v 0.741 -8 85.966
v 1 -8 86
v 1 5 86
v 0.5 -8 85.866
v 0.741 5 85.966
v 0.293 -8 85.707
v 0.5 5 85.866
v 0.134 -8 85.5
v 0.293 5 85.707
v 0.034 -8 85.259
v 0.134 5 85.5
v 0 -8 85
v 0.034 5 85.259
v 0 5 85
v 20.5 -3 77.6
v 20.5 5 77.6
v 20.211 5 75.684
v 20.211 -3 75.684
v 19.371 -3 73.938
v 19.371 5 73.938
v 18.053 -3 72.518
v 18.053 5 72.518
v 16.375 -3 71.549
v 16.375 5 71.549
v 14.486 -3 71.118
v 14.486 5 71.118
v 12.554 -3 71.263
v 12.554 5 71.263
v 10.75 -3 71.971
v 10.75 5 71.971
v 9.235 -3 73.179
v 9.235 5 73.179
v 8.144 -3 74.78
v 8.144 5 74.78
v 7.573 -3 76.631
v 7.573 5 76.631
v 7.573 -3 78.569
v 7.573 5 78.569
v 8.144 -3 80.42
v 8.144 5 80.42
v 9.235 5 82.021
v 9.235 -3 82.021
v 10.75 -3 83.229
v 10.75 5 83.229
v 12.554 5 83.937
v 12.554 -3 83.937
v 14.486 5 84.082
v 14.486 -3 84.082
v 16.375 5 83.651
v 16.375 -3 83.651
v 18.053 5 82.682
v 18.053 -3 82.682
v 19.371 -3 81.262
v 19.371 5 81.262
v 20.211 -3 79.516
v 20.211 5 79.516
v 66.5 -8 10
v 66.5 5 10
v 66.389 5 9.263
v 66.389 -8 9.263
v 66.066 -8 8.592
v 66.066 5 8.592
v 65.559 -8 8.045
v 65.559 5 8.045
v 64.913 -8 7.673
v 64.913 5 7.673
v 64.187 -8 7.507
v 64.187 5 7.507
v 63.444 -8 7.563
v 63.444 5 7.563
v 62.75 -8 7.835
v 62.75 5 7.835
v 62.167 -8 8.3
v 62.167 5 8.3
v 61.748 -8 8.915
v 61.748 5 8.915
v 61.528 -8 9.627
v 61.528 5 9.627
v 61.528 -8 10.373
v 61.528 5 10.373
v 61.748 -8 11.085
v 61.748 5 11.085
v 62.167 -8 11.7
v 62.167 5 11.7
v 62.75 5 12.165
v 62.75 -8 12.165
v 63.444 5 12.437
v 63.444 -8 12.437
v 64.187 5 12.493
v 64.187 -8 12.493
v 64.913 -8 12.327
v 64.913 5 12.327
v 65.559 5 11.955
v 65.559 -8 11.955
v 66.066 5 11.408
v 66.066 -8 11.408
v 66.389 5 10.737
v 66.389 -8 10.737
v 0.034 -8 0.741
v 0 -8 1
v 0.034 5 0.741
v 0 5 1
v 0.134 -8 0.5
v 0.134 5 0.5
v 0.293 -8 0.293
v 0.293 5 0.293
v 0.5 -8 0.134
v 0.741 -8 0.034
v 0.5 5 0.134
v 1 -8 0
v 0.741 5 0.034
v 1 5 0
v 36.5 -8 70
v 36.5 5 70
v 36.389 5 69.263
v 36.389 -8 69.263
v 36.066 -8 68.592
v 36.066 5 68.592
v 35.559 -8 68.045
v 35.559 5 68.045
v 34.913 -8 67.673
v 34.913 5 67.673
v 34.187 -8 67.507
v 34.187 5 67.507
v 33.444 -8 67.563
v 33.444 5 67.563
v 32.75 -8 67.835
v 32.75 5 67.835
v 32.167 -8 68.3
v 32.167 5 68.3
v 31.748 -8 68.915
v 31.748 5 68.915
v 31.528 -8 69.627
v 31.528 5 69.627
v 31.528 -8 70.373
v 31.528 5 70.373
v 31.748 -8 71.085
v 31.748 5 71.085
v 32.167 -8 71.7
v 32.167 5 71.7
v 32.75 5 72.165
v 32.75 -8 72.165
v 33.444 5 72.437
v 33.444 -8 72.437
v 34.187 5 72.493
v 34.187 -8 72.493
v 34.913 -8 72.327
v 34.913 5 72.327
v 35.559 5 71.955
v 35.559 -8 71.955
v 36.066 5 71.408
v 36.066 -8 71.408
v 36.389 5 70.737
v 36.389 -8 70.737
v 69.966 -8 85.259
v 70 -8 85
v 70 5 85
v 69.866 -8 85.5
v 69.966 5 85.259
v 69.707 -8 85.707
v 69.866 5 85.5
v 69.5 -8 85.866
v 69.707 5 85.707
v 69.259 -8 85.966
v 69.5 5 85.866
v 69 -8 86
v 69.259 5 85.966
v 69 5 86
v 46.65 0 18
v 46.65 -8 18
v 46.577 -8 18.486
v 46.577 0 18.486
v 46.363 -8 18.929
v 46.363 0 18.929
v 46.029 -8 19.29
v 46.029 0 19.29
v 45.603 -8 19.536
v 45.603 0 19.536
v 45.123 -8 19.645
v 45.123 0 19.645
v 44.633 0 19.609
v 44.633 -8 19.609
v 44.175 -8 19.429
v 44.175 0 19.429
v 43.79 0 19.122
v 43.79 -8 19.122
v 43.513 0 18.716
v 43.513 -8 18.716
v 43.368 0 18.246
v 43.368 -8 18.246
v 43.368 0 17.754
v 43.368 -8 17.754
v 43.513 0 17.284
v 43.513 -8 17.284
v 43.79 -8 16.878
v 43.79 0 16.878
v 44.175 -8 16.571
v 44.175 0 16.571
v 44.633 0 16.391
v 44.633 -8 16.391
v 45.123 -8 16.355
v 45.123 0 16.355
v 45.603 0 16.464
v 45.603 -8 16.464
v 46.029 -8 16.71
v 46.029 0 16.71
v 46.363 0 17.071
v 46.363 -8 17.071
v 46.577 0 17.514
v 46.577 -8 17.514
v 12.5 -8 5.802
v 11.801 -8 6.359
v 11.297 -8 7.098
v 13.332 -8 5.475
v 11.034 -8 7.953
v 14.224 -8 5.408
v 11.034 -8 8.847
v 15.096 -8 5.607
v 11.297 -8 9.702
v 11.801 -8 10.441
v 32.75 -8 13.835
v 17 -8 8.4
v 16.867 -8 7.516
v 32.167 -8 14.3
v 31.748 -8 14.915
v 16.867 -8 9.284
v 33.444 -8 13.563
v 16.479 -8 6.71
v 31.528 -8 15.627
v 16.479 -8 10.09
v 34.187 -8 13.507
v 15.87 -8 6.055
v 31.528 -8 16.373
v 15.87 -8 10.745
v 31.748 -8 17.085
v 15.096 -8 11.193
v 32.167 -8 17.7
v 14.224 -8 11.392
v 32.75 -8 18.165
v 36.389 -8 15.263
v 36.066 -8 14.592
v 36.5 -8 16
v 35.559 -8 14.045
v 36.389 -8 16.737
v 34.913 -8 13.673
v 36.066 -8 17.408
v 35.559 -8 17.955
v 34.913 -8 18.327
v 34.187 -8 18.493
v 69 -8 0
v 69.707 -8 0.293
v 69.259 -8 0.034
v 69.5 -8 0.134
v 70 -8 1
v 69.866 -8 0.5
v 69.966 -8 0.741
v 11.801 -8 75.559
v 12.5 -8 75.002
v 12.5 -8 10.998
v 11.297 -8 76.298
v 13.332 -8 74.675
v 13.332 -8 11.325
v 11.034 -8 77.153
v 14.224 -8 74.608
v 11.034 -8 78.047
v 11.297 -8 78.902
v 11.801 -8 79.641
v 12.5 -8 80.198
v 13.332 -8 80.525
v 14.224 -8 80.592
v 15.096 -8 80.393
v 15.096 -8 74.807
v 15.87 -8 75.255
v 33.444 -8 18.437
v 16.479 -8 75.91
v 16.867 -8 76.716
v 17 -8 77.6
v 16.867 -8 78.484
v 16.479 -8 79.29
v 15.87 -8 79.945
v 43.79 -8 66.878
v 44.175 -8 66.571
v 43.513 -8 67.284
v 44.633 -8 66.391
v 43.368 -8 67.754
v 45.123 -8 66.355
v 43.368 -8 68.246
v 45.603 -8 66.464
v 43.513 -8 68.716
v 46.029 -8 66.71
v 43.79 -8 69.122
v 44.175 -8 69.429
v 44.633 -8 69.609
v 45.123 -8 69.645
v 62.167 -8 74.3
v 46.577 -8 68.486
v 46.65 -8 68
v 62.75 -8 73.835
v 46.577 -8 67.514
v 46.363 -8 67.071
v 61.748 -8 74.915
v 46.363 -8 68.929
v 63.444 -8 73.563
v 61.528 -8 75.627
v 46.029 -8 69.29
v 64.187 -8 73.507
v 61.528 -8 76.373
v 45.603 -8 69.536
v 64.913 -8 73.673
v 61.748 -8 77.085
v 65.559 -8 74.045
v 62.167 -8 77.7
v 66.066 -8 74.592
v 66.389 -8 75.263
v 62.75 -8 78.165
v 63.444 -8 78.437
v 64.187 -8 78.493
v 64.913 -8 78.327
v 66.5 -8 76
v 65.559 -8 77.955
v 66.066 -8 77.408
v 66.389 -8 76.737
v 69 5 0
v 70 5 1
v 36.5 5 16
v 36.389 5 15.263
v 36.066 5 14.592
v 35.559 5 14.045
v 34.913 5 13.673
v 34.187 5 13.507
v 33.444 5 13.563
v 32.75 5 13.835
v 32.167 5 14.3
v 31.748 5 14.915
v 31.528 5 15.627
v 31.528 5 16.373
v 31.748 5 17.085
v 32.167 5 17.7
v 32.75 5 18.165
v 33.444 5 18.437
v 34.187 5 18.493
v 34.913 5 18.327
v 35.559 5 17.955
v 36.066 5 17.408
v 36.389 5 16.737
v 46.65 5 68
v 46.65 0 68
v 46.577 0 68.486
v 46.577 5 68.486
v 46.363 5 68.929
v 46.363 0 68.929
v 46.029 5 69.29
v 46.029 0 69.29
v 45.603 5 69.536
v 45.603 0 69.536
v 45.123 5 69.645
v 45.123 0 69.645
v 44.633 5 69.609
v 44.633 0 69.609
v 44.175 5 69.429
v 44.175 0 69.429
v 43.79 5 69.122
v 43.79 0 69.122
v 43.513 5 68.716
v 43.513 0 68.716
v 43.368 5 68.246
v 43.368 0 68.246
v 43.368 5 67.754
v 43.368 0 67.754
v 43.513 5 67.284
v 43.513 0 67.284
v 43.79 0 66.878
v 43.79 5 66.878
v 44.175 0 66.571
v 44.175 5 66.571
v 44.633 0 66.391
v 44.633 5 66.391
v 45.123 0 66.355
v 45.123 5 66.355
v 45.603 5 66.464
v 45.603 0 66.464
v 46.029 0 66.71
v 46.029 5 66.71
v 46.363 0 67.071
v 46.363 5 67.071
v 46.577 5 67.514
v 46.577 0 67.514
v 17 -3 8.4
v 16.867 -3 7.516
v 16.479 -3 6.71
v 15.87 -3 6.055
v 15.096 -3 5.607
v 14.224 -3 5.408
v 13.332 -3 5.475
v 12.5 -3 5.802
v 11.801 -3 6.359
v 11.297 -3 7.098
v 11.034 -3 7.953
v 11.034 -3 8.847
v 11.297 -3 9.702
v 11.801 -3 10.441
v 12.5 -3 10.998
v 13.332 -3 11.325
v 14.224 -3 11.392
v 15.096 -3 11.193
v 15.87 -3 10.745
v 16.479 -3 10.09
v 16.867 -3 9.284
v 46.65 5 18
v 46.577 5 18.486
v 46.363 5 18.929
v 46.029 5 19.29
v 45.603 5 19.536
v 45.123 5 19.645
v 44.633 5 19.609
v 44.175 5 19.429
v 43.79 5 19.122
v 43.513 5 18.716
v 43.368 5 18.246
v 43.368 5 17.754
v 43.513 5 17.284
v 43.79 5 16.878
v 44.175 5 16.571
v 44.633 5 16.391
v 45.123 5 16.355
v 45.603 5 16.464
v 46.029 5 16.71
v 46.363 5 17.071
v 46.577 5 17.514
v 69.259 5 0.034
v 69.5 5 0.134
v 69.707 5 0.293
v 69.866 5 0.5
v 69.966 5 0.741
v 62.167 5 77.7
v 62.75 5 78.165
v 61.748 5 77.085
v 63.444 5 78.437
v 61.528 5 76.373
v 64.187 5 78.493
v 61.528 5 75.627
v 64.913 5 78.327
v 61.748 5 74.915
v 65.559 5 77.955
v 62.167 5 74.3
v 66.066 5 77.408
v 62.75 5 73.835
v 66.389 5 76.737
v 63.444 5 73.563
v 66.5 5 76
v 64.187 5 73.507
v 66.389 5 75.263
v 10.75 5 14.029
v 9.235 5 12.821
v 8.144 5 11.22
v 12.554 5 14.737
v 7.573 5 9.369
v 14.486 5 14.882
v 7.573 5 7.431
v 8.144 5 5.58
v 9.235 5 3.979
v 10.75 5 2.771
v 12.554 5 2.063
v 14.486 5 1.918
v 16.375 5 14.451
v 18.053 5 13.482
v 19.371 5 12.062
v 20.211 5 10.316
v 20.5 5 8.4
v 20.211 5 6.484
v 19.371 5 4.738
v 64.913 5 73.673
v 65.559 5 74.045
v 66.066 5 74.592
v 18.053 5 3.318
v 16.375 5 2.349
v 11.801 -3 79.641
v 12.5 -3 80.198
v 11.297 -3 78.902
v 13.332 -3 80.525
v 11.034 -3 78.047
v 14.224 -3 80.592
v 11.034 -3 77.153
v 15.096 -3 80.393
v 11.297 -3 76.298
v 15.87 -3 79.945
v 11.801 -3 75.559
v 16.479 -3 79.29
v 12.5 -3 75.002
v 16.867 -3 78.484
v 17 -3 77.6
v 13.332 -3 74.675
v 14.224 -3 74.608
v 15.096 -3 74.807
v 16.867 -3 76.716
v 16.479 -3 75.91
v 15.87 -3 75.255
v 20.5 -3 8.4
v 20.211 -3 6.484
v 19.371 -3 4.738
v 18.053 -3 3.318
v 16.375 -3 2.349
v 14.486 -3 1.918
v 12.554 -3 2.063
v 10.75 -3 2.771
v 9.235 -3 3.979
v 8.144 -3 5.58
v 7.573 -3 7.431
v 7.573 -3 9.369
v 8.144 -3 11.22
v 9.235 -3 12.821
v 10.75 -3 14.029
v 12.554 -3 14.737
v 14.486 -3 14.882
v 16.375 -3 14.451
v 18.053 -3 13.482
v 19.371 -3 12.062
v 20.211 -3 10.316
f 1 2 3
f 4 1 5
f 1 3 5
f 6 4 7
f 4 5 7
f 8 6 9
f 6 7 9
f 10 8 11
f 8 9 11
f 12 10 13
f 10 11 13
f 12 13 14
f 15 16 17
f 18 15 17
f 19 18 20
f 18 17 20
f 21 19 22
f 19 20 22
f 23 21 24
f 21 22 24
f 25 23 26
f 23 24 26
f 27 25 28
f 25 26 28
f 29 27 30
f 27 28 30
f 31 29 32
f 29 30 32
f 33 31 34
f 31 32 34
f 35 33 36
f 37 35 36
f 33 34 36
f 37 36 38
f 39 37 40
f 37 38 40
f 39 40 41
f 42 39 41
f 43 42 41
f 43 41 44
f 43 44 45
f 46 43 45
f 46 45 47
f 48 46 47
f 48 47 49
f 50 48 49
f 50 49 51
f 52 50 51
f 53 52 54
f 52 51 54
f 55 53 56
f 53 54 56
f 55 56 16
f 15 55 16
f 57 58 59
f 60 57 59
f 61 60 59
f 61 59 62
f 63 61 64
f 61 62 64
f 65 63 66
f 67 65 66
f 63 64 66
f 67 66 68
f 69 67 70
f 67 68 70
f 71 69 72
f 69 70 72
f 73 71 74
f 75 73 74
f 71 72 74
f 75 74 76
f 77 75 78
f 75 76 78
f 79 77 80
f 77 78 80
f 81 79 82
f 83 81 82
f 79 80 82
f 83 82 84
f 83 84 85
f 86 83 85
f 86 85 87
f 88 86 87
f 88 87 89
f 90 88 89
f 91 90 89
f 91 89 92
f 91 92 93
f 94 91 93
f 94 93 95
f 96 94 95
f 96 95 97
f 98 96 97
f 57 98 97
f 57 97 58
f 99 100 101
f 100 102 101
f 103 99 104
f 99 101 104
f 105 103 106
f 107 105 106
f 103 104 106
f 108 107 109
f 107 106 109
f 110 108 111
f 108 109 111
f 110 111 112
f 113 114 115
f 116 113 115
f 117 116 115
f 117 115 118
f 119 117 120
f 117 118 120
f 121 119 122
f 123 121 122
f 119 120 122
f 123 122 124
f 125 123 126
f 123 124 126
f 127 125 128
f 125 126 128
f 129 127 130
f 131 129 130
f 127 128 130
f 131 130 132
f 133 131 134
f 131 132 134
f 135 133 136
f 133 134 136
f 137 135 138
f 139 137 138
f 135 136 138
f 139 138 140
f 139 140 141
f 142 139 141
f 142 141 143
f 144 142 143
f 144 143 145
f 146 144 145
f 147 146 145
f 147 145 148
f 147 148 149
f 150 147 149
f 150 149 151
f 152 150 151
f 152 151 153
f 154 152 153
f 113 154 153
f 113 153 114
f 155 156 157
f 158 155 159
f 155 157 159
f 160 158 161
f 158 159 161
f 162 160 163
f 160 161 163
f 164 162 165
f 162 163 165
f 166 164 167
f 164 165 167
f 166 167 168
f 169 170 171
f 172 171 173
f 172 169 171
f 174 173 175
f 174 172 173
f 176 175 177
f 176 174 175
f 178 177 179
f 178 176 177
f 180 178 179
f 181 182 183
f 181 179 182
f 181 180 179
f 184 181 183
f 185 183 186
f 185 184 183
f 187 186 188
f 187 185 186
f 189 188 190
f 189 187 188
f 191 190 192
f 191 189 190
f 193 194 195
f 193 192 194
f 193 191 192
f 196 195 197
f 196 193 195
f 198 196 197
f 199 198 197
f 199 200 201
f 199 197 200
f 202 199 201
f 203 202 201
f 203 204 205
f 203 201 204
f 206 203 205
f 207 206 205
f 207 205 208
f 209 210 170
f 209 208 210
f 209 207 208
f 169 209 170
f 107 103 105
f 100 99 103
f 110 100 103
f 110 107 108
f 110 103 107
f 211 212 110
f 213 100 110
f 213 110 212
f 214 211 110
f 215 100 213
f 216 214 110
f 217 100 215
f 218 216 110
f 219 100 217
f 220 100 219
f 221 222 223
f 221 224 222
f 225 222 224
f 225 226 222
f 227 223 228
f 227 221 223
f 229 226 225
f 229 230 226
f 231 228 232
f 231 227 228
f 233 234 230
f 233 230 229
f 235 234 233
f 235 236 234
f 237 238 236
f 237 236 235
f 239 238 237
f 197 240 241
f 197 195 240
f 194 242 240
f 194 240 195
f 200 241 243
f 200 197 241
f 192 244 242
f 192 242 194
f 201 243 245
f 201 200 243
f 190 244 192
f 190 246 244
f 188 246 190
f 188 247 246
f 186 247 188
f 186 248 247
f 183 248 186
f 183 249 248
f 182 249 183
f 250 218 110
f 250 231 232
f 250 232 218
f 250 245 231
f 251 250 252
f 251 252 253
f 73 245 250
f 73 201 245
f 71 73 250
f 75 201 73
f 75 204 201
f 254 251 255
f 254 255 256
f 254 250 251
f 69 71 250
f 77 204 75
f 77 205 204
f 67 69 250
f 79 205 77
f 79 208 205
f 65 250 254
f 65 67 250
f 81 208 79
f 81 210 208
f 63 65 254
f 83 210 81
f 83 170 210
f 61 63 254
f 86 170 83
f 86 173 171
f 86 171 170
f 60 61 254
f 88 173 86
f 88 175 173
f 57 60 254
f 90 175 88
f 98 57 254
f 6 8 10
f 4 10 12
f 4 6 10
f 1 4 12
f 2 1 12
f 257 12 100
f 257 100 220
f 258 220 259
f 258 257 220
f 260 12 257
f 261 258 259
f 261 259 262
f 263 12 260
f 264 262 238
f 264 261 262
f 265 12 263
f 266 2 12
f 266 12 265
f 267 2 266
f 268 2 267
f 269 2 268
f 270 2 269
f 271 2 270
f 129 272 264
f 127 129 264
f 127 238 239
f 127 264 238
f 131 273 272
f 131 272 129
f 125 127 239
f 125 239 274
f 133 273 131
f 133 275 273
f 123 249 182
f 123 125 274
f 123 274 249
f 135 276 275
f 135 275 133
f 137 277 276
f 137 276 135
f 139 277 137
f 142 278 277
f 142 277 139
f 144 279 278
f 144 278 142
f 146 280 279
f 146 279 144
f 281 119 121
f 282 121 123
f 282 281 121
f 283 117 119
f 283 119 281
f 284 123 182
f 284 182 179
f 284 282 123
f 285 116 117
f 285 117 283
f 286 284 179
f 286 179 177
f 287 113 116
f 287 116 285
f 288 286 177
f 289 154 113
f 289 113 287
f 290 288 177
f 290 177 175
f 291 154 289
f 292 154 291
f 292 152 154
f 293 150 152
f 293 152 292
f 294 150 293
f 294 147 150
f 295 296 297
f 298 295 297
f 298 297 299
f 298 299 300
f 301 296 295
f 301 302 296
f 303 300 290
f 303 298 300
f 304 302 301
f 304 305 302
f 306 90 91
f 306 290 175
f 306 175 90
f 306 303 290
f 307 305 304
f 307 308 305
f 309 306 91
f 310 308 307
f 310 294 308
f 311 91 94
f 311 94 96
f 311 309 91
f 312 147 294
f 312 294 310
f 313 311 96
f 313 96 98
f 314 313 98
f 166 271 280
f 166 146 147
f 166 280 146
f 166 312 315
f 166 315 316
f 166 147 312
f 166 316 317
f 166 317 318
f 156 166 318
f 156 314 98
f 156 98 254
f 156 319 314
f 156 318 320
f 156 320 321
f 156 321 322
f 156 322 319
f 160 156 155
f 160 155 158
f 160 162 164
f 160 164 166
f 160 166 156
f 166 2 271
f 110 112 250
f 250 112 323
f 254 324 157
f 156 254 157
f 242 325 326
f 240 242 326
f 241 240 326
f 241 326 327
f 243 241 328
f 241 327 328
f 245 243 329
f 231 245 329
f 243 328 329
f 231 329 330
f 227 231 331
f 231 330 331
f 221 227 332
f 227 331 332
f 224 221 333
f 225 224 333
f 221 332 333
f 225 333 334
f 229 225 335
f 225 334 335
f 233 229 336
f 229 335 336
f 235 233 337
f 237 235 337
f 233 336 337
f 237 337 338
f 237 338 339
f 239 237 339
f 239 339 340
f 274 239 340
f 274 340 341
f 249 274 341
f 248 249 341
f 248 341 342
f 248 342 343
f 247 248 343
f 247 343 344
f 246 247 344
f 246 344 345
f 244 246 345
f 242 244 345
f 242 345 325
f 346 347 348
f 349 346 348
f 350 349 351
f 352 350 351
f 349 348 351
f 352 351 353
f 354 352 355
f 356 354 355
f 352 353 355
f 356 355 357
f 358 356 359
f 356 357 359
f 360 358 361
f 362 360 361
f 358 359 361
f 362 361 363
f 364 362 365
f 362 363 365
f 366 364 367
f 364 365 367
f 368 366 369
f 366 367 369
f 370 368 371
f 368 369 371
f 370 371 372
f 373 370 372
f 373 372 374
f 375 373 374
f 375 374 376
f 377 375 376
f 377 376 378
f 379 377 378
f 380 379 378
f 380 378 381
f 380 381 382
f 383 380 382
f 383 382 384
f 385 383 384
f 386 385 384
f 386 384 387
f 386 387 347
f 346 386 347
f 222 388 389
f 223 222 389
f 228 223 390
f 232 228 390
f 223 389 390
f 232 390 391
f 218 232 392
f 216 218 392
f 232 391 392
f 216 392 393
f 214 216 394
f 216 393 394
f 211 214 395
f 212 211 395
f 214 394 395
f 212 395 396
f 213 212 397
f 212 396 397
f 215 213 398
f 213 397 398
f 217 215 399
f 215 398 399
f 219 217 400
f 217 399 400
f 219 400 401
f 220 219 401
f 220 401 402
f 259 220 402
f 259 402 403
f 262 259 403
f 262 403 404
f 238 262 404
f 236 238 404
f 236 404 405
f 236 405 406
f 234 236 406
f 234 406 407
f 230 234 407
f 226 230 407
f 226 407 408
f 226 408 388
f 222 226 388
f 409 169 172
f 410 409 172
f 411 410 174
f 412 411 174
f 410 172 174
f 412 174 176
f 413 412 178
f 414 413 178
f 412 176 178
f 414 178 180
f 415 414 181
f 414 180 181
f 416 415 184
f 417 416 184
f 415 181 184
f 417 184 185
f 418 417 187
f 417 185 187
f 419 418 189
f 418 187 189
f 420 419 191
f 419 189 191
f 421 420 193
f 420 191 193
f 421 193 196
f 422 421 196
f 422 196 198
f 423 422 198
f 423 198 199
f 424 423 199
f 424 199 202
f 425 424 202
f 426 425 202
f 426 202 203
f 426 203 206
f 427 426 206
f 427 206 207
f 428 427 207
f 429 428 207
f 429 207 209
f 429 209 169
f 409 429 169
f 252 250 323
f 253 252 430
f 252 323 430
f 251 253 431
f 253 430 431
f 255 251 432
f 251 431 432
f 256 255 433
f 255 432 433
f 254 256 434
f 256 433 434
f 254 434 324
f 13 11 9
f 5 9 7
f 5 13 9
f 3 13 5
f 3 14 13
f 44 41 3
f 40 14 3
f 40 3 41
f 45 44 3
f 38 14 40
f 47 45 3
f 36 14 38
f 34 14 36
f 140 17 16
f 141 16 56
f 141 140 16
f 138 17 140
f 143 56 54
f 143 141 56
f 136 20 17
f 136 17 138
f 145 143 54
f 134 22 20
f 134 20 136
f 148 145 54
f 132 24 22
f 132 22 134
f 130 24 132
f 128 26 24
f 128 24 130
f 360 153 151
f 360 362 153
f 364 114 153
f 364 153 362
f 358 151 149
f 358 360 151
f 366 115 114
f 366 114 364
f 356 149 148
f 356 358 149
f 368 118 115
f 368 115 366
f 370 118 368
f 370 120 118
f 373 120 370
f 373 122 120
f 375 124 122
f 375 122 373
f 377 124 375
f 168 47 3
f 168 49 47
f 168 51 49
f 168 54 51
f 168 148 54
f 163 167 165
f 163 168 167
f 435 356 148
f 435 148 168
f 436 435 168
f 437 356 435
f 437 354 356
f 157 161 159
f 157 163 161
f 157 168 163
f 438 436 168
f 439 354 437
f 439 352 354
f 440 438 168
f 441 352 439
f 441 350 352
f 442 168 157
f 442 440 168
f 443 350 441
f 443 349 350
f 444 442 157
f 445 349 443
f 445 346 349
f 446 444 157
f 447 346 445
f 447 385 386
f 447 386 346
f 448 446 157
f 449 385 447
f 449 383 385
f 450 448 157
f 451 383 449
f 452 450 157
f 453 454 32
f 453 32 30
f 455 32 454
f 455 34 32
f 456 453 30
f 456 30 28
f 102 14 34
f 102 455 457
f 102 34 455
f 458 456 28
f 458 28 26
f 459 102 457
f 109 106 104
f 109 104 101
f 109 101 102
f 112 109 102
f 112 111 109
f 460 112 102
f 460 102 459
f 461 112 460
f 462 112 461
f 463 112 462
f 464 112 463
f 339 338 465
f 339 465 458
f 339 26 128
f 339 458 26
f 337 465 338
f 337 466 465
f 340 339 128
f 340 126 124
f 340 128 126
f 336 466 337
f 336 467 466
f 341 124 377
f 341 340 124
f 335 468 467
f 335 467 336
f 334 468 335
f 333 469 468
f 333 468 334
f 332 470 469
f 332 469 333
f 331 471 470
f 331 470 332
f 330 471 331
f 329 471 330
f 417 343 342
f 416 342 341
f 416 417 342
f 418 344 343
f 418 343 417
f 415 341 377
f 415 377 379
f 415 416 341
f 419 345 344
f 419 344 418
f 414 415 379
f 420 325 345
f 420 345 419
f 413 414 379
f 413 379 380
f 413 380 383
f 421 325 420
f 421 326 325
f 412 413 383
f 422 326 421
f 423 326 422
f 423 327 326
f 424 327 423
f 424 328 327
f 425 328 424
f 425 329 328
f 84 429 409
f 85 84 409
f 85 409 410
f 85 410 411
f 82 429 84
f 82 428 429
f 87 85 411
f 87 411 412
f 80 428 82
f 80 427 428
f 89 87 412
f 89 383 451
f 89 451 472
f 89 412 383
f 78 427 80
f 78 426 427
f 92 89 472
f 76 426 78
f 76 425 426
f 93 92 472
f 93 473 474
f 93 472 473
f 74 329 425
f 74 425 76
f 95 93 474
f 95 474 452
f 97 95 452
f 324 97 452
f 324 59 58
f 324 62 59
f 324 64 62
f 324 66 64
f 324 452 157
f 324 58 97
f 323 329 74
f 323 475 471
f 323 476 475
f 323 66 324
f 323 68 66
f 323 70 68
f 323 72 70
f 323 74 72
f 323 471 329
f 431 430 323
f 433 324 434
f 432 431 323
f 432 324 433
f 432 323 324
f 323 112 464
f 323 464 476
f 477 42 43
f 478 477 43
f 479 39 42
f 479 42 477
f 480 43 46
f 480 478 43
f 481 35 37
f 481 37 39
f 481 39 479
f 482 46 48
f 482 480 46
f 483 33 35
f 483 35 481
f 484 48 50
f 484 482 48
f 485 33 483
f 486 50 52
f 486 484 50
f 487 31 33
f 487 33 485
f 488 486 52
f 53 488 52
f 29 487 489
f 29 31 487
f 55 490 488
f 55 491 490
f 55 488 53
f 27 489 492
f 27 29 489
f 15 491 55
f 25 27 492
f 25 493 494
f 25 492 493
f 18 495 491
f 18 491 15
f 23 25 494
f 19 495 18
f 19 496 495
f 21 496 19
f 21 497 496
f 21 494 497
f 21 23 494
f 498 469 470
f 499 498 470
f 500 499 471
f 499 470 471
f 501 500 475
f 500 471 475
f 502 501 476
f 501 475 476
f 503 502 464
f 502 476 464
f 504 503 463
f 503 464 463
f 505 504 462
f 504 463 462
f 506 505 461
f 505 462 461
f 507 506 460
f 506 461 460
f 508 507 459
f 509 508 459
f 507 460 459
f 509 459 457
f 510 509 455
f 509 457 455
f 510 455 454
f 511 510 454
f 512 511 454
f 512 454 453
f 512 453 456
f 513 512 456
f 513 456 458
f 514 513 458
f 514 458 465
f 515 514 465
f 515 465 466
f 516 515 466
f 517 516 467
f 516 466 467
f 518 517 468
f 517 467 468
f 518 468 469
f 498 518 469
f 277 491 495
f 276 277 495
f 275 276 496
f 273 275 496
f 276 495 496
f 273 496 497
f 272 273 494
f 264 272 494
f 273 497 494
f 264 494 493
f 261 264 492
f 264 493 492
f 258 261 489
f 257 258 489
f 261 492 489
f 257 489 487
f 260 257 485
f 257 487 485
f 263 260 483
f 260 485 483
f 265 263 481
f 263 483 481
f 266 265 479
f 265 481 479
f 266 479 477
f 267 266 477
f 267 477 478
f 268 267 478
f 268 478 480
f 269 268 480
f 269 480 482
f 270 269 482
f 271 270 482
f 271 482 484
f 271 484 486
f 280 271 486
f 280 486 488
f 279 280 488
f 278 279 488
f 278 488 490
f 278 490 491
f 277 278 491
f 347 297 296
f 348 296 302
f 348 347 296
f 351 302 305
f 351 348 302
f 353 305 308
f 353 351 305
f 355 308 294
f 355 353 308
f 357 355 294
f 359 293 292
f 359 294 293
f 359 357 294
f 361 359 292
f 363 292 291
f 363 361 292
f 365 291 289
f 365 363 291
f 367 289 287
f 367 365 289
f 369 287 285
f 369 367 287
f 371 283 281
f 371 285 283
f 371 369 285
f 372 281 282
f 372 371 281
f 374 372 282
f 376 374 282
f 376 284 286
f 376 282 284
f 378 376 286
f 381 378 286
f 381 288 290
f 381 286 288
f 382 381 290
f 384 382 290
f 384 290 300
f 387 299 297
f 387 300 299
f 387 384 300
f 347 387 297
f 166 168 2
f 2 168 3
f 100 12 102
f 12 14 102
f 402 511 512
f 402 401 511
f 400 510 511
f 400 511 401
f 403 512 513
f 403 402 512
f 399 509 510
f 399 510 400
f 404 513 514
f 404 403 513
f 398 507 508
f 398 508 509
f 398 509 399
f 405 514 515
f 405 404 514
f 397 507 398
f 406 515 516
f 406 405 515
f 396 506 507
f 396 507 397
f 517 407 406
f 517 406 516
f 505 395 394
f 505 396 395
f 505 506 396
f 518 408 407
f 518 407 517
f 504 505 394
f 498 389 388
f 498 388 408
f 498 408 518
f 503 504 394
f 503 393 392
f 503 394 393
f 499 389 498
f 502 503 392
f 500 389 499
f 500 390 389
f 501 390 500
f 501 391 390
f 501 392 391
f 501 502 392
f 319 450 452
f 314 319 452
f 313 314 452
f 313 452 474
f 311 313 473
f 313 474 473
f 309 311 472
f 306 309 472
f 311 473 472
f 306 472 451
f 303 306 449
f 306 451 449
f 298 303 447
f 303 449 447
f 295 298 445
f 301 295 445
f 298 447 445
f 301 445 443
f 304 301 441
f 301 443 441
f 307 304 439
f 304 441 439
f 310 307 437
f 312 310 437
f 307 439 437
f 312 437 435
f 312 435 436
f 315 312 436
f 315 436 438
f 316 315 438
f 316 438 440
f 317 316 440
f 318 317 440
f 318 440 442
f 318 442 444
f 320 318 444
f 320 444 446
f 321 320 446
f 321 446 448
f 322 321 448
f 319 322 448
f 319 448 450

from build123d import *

# Parameters (mm, degrees)
SKETCH1_W               = 70
SKETCH1_H               = 86
BOSS_EXTRUDE1_DEPTH     = 5
SKETCH2_W               = 12
SKETCH2_H               = 86
BOSS_EXTRUDE2_DEPTH     = 87
SKETCH4_R               = 38
CUT_EXTRUDE2_DEPTH      = 3
SKETCH5_R               = 2.6
CUT_EXTRUDE3_DEPTH      = 13
FILLET1_R               = 3
SKETCH6_R               = 20
CUT_EXTRUDE4_DEPTH      = 13
SKETCH7_W               = 12
SKETCH7_H               = 87
CUT_EXTRUDE5_DEPTH      = 87
FILLET2_R               = 1
BOSS_EXTRUDE4_DEPTH     = 8
SKETCH3_R               = 3
CUT_EXTRUDE1_DEPTH      = 14
SKETCH8_R               = 1.65
CUT_EXTRUDE6_DEPTH      = 9
CUT_EXTRUDE6_DEPTH_BACK = 6
SKETCH9_R               = 2.5
CUT_EXTRUDE7_DEPTH      = 14
SKETCH14_R              = 6.5
CUT_EXTRUDE8_DEPTH      = 8


with BuildPart() as part:
    # Sketch1 → Boss-Extrude1 (new body)
    with BuildSketch(Plane(origin=(0, 0, 0), x_dir=(1, 0, 0), z_dir=(0, 1, 0))):
        with Locations((35, -43)):
            Rectangle(SKETCH1_W, SKETCH1_H)
    extrude(amount=BOSS_EXTRUDE1_DEPTH)

    # Sketch2 → Boss-Extrude2 (add)
    with BuildSketch(Plane(origin=(0, 5, 0), x_dir=(1, 0, 0), z_dir=(0, 1, 0))):
        with Locations((64, -43)):
            Rectangle(SKETCH2_W, SKETCH2_H)
    extrude(amount=BOSS_EXTRUDE2_DEPTH)

    # Sketch4 → Cut-Extrude2 (cut)
    with BuildSketch(Plane.ZY.offset(-58)):
        with Locations((43, 56)):
            Circle(SKETCH4_R)
    extrude(amount=-CUT_EXTRUDE2_DEPTH, mode=Mode.SUBTRACT)

    # Sketch5 → Cut-Extrude3 (cut, through all)
    with BuildSketch(Plane.ZY.offset(-58)):
        with Locations((77.8, 90.8)):
            Circle(SKETCH5_R)
        with Locations((77.8, 21.2)):
            Circle(SKETCH5_R)
        with Locations((8.2, 90.8)):
            Circle(SKETCH5_R)
        with Locations((8.2, 21.2)):
            Circle(SKETCH5_R)
    extrude(amount=-CUT_EXTRUDE3_DEPTH, mode=Mode.SUBTRACT)

    # Fillet1
    fillet1_edges = [part.edges().sort_by_distance(p)[0] for p in [
        (64, 92, 0),
        (64, 92, 86),
    ]]
    fillet(fillet1_edges, radius=FILLET1_R)

    # Sketch6 → Cut-Extrude4 (cut, through all)
    with BuildSketch(Plane.ZY.offset(-58)):
        with Locations((43, 56)):
            Circle(SKETCH6_R)
    extrude(amount=-CUT_EXTRUDE4_DEPTH, mode=Mode.SUBTRACT)

    # Sketch7 → Cut-Extrude5 (cut, through all)
    with BuildSketch(Plane.XY.offset(86)):
        with Locations((64, 48.5)):
            Rectangle(SKETCH7_W, SKETCH7_H)
    extrude(amount=-CUT_EXTRUDE5_DEPTH, mode=Mode.SUBTRACT)

    # Fillet2
    fillet2_edges = [part.edges().sort_by_distance(p)[0] for p in [
        (0, 2.5, 0),
        (0, 2.5, 86),
        (70, 2.5, 0),
        (70, 2.5, 86),
    ]]
    fillet(fillet2_edges, radius=FILLET2_R)

    # Sketch12 → Boss-Extrude4 (add)
    with BuildSketch(Plane.XZ):
        with BuildLine():
            Line((70, 1), (70, 85))
            ThreePointArc((70, 85), (69.707106781, 85.707106781), (69, 86))
            Line((69, 86), (1, 86))
            ThreePointArc((1, 86), (0.292893219, 85.707106781), (0, 85))
            Line((0, 85), (0, 1))
            ThreePointArc((0, 1), (0.292893219, 0.292893219), (1, 0))
            Line((1, 0), (69, 0))
            ThreePointArc((69, 0), (69.707106781, 0.292893219), (70, 1))
        make_face()
    extrude(amount=BOSS_EXTRUDE4_DEPTH)

    # Sketch3 → Cut-Extrude1 (cut, through all)
    with BuildSketch(Plane(origin=(0, 5, 0), x_dir=(1, 0, 0), z_dir=(0, 1, 0))):
        with Locations((14, -8.4)):
            Circle(SKETCH3_R)
        with Locations((14, -77.6)):
            Circle(SKETCH3_R)
    extrude(amount=-CUT_EXTRUDE1_DEPTH, mode=Mode.SUBTRACT)

    # Sketch8 → Cut-Extrude6 (cut, two sides)
    with BuildSketch(Plane.XZ) as cut_extrude6_sk:
        with Locations((45, 68)):
            Circle(SKETCH8_R)
        with Locations((45, 18)):
            Circle(SKETCH8_R)
    extrude(amount=CUT_EXTRUDE6_DEPTH, mode=Mode.SUBTRACT)
    extrude(cut_extrude6_sk.sketch, amount=-CUT_EXTRUDE6_DEPTH_BACK, mode=Mode.SUBTRACT)

    # Sketch9 → Cut-Extrude7 (cut, through all)
    with BuildSketch(Plane(origin=(0, 5, 0), x_dir=(1, 0, 0), z_dir=(0, 1, 0))):
        with Locations((64, -10)):
            Circle(SKETCH9_R)
        with Locations((64, -76)):
            Circle(SKETCH9_R)
        with Locations((34, -70)):
            Circle(SKETCH9_R)
        with Locations((34, -16)):
            Circle(SKETCH9_R)
    extrude(amount=-CUT_EXTRUDE7_DEPTH, mode=Mode.SUBTRACT)

    # Sketch14 → Cut-Extrude8 (cut)
    with BuildSketch(Plane(origin=(0, 5, 0), x_dir=(1, 0, 0), z_dir=(0, 1, 0))):
        with Locations((14, -8.4)):
            Circle(SKETCH14_R)
        with Locations((14, -77.6)):
            Circle(SKETCH14_R)
    extrude(amount=-CUT_EXTRUDE8_DEPTH, mode=Mode.SUBTRACT)


solid = part.part
